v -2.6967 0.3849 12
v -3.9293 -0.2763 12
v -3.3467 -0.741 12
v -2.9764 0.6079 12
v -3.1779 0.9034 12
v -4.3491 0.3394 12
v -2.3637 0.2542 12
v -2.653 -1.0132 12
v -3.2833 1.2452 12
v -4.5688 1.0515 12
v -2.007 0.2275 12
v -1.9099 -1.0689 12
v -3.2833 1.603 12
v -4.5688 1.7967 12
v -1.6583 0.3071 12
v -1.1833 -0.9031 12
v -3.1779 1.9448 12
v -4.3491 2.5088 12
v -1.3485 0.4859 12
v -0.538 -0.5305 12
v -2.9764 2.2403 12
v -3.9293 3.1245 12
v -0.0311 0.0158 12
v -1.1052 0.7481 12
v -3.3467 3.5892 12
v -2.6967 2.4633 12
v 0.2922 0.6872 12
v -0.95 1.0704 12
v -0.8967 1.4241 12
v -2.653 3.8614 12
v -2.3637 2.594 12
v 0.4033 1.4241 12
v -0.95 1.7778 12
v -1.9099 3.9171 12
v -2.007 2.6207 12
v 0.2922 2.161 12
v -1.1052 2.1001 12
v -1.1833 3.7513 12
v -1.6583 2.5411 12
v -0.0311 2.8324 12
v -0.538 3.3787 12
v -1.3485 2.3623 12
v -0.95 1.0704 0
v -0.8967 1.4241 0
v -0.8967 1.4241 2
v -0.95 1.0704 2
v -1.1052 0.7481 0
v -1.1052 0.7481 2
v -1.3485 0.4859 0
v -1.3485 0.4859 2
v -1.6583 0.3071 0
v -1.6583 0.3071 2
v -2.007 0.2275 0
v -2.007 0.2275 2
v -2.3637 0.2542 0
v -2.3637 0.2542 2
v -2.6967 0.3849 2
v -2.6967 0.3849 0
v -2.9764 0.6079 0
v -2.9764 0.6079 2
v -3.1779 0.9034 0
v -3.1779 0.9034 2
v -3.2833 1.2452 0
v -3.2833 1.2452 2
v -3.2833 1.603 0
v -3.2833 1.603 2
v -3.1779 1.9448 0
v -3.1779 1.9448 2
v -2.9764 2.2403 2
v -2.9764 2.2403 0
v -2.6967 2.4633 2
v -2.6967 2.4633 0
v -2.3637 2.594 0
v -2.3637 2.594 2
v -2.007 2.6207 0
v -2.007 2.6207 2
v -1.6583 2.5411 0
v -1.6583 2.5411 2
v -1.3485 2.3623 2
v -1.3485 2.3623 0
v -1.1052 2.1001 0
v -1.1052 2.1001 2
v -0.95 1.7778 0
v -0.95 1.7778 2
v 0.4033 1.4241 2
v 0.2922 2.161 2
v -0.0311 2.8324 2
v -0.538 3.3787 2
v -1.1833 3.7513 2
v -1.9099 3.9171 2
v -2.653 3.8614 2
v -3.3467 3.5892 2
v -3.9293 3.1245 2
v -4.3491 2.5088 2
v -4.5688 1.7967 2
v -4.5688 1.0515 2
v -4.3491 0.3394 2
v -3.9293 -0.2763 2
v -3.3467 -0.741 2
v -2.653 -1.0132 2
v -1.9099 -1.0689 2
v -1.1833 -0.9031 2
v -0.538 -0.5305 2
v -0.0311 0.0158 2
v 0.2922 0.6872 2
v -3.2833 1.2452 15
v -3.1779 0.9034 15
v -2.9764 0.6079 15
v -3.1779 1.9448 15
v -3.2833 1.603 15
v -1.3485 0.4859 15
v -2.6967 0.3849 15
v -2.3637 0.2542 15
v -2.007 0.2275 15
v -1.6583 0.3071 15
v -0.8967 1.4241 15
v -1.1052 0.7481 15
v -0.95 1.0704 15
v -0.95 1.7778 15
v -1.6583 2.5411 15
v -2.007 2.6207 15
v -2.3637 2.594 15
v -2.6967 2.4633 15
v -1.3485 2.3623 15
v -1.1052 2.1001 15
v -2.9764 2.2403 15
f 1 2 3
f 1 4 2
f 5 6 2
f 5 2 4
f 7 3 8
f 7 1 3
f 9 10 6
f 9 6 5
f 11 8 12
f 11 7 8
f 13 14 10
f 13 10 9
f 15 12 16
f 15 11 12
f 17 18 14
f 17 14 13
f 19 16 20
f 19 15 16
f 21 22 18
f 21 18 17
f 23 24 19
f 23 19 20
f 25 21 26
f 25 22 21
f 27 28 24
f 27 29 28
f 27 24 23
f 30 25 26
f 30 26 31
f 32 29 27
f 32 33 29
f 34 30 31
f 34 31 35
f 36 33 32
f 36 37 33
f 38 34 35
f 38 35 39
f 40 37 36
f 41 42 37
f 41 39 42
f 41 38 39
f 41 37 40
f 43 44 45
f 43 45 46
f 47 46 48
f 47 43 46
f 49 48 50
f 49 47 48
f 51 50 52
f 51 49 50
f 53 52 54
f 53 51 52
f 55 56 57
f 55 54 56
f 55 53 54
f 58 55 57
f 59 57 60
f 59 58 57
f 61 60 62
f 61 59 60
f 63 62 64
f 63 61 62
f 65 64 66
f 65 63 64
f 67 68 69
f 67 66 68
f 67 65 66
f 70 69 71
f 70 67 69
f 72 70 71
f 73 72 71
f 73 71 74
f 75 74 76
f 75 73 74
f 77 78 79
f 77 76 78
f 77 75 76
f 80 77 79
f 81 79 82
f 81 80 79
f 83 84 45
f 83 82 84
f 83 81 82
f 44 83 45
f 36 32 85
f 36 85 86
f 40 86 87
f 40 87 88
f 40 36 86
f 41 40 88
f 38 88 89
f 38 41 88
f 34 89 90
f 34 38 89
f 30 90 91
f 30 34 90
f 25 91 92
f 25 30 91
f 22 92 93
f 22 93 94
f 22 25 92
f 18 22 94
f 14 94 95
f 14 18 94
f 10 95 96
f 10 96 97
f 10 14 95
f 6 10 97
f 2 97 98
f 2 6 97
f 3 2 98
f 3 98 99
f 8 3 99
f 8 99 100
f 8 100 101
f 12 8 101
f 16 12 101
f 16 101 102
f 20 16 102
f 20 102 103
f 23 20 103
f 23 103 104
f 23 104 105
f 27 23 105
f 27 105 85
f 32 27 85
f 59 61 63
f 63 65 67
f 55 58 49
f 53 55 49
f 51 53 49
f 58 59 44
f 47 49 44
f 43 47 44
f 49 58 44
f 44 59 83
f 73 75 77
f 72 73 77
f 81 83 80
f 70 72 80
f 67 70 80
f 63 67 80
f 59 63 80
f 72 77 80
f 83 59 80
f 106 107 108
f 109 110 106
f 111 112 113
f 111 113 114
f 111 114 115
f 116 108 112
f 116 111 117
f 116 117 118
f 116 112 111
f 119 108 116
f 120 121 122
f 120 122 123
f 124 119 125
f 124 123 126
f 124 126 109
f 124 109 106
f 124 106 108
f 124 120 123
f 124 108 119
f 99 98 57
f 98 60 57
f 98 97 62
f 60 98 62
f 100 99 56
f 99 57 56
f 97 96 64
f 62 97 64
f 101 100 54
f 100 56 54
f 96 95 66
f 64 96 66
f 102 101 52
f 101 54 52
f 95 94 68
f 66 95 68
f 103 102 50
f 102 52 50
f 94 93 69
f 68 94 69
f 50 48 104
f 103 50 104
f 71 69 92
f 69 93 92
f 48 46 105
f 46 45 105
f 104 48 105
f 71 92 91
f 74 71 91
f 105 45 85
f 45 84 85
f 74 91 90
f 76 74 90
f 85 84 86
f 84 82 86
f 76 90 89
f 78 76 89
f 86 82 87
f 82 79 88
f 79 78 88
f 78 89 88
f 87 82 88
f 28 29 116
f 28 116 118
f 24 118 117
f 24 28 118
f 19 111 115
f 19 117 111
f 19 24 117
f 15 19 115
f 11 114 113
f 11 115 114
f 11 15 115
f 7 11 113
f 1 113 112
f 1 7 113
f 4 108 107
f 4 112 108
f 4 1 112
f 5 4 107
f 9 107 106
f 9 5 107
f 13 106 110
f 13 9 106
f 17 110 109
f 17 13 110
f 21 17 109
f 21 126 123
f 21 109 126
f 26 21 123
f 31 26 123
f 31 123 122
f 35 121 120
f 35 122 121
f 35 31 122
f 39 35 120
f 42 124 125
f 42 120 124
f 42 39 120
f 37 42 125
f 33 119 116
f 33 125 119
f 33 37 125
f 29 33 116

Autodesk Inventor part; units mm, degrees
ref_plane "YZ Plane" through (0, 0, 0) normal (1, 0, 0) x (0, 1, 0)
ref_plane "XZ Plane" through (0, 0, 0) normal (0, 1, 0) x (-1, 0, 0)
ref_plane "XY Plane" through (0, 0, 0) normal (0, 0, 1) x (1, 0, 0)
sketch "Sketch1" plane through (0, 0, 0) normal (0, 0, 1) x (1, 0, 0)
  circle A0 centre (-2.0967, 1.4241) radius 1.2
  point P0 (0, 0)
  dimension "d0" = 2.4
extrude "Extrusion1" add sketch "Sketch1" along normal blind 15
ref_plane "Work Plane1" through (-2.0967, 1.4241, 12) normal (0, 0, 1) x (1, 0, 0)
sketch "Sketch3" plane through (-2.0967, 1.4241, 12) normal (0, 0, 1) x (1, 0, 0)
  circle A0 centre (0, 0) radius 1.2 projected
  circle A1 centre (0, 0) radius 1.2 projected
  circle A2 centre (0, 0) radius 2.5
  point P0 (2.0967, -1.4241)
  dimension "d4" = 5
extrude "Extrusion2" add sketch "Sketch3" against normal blind 10
properties part number "M2" material "Silver"
